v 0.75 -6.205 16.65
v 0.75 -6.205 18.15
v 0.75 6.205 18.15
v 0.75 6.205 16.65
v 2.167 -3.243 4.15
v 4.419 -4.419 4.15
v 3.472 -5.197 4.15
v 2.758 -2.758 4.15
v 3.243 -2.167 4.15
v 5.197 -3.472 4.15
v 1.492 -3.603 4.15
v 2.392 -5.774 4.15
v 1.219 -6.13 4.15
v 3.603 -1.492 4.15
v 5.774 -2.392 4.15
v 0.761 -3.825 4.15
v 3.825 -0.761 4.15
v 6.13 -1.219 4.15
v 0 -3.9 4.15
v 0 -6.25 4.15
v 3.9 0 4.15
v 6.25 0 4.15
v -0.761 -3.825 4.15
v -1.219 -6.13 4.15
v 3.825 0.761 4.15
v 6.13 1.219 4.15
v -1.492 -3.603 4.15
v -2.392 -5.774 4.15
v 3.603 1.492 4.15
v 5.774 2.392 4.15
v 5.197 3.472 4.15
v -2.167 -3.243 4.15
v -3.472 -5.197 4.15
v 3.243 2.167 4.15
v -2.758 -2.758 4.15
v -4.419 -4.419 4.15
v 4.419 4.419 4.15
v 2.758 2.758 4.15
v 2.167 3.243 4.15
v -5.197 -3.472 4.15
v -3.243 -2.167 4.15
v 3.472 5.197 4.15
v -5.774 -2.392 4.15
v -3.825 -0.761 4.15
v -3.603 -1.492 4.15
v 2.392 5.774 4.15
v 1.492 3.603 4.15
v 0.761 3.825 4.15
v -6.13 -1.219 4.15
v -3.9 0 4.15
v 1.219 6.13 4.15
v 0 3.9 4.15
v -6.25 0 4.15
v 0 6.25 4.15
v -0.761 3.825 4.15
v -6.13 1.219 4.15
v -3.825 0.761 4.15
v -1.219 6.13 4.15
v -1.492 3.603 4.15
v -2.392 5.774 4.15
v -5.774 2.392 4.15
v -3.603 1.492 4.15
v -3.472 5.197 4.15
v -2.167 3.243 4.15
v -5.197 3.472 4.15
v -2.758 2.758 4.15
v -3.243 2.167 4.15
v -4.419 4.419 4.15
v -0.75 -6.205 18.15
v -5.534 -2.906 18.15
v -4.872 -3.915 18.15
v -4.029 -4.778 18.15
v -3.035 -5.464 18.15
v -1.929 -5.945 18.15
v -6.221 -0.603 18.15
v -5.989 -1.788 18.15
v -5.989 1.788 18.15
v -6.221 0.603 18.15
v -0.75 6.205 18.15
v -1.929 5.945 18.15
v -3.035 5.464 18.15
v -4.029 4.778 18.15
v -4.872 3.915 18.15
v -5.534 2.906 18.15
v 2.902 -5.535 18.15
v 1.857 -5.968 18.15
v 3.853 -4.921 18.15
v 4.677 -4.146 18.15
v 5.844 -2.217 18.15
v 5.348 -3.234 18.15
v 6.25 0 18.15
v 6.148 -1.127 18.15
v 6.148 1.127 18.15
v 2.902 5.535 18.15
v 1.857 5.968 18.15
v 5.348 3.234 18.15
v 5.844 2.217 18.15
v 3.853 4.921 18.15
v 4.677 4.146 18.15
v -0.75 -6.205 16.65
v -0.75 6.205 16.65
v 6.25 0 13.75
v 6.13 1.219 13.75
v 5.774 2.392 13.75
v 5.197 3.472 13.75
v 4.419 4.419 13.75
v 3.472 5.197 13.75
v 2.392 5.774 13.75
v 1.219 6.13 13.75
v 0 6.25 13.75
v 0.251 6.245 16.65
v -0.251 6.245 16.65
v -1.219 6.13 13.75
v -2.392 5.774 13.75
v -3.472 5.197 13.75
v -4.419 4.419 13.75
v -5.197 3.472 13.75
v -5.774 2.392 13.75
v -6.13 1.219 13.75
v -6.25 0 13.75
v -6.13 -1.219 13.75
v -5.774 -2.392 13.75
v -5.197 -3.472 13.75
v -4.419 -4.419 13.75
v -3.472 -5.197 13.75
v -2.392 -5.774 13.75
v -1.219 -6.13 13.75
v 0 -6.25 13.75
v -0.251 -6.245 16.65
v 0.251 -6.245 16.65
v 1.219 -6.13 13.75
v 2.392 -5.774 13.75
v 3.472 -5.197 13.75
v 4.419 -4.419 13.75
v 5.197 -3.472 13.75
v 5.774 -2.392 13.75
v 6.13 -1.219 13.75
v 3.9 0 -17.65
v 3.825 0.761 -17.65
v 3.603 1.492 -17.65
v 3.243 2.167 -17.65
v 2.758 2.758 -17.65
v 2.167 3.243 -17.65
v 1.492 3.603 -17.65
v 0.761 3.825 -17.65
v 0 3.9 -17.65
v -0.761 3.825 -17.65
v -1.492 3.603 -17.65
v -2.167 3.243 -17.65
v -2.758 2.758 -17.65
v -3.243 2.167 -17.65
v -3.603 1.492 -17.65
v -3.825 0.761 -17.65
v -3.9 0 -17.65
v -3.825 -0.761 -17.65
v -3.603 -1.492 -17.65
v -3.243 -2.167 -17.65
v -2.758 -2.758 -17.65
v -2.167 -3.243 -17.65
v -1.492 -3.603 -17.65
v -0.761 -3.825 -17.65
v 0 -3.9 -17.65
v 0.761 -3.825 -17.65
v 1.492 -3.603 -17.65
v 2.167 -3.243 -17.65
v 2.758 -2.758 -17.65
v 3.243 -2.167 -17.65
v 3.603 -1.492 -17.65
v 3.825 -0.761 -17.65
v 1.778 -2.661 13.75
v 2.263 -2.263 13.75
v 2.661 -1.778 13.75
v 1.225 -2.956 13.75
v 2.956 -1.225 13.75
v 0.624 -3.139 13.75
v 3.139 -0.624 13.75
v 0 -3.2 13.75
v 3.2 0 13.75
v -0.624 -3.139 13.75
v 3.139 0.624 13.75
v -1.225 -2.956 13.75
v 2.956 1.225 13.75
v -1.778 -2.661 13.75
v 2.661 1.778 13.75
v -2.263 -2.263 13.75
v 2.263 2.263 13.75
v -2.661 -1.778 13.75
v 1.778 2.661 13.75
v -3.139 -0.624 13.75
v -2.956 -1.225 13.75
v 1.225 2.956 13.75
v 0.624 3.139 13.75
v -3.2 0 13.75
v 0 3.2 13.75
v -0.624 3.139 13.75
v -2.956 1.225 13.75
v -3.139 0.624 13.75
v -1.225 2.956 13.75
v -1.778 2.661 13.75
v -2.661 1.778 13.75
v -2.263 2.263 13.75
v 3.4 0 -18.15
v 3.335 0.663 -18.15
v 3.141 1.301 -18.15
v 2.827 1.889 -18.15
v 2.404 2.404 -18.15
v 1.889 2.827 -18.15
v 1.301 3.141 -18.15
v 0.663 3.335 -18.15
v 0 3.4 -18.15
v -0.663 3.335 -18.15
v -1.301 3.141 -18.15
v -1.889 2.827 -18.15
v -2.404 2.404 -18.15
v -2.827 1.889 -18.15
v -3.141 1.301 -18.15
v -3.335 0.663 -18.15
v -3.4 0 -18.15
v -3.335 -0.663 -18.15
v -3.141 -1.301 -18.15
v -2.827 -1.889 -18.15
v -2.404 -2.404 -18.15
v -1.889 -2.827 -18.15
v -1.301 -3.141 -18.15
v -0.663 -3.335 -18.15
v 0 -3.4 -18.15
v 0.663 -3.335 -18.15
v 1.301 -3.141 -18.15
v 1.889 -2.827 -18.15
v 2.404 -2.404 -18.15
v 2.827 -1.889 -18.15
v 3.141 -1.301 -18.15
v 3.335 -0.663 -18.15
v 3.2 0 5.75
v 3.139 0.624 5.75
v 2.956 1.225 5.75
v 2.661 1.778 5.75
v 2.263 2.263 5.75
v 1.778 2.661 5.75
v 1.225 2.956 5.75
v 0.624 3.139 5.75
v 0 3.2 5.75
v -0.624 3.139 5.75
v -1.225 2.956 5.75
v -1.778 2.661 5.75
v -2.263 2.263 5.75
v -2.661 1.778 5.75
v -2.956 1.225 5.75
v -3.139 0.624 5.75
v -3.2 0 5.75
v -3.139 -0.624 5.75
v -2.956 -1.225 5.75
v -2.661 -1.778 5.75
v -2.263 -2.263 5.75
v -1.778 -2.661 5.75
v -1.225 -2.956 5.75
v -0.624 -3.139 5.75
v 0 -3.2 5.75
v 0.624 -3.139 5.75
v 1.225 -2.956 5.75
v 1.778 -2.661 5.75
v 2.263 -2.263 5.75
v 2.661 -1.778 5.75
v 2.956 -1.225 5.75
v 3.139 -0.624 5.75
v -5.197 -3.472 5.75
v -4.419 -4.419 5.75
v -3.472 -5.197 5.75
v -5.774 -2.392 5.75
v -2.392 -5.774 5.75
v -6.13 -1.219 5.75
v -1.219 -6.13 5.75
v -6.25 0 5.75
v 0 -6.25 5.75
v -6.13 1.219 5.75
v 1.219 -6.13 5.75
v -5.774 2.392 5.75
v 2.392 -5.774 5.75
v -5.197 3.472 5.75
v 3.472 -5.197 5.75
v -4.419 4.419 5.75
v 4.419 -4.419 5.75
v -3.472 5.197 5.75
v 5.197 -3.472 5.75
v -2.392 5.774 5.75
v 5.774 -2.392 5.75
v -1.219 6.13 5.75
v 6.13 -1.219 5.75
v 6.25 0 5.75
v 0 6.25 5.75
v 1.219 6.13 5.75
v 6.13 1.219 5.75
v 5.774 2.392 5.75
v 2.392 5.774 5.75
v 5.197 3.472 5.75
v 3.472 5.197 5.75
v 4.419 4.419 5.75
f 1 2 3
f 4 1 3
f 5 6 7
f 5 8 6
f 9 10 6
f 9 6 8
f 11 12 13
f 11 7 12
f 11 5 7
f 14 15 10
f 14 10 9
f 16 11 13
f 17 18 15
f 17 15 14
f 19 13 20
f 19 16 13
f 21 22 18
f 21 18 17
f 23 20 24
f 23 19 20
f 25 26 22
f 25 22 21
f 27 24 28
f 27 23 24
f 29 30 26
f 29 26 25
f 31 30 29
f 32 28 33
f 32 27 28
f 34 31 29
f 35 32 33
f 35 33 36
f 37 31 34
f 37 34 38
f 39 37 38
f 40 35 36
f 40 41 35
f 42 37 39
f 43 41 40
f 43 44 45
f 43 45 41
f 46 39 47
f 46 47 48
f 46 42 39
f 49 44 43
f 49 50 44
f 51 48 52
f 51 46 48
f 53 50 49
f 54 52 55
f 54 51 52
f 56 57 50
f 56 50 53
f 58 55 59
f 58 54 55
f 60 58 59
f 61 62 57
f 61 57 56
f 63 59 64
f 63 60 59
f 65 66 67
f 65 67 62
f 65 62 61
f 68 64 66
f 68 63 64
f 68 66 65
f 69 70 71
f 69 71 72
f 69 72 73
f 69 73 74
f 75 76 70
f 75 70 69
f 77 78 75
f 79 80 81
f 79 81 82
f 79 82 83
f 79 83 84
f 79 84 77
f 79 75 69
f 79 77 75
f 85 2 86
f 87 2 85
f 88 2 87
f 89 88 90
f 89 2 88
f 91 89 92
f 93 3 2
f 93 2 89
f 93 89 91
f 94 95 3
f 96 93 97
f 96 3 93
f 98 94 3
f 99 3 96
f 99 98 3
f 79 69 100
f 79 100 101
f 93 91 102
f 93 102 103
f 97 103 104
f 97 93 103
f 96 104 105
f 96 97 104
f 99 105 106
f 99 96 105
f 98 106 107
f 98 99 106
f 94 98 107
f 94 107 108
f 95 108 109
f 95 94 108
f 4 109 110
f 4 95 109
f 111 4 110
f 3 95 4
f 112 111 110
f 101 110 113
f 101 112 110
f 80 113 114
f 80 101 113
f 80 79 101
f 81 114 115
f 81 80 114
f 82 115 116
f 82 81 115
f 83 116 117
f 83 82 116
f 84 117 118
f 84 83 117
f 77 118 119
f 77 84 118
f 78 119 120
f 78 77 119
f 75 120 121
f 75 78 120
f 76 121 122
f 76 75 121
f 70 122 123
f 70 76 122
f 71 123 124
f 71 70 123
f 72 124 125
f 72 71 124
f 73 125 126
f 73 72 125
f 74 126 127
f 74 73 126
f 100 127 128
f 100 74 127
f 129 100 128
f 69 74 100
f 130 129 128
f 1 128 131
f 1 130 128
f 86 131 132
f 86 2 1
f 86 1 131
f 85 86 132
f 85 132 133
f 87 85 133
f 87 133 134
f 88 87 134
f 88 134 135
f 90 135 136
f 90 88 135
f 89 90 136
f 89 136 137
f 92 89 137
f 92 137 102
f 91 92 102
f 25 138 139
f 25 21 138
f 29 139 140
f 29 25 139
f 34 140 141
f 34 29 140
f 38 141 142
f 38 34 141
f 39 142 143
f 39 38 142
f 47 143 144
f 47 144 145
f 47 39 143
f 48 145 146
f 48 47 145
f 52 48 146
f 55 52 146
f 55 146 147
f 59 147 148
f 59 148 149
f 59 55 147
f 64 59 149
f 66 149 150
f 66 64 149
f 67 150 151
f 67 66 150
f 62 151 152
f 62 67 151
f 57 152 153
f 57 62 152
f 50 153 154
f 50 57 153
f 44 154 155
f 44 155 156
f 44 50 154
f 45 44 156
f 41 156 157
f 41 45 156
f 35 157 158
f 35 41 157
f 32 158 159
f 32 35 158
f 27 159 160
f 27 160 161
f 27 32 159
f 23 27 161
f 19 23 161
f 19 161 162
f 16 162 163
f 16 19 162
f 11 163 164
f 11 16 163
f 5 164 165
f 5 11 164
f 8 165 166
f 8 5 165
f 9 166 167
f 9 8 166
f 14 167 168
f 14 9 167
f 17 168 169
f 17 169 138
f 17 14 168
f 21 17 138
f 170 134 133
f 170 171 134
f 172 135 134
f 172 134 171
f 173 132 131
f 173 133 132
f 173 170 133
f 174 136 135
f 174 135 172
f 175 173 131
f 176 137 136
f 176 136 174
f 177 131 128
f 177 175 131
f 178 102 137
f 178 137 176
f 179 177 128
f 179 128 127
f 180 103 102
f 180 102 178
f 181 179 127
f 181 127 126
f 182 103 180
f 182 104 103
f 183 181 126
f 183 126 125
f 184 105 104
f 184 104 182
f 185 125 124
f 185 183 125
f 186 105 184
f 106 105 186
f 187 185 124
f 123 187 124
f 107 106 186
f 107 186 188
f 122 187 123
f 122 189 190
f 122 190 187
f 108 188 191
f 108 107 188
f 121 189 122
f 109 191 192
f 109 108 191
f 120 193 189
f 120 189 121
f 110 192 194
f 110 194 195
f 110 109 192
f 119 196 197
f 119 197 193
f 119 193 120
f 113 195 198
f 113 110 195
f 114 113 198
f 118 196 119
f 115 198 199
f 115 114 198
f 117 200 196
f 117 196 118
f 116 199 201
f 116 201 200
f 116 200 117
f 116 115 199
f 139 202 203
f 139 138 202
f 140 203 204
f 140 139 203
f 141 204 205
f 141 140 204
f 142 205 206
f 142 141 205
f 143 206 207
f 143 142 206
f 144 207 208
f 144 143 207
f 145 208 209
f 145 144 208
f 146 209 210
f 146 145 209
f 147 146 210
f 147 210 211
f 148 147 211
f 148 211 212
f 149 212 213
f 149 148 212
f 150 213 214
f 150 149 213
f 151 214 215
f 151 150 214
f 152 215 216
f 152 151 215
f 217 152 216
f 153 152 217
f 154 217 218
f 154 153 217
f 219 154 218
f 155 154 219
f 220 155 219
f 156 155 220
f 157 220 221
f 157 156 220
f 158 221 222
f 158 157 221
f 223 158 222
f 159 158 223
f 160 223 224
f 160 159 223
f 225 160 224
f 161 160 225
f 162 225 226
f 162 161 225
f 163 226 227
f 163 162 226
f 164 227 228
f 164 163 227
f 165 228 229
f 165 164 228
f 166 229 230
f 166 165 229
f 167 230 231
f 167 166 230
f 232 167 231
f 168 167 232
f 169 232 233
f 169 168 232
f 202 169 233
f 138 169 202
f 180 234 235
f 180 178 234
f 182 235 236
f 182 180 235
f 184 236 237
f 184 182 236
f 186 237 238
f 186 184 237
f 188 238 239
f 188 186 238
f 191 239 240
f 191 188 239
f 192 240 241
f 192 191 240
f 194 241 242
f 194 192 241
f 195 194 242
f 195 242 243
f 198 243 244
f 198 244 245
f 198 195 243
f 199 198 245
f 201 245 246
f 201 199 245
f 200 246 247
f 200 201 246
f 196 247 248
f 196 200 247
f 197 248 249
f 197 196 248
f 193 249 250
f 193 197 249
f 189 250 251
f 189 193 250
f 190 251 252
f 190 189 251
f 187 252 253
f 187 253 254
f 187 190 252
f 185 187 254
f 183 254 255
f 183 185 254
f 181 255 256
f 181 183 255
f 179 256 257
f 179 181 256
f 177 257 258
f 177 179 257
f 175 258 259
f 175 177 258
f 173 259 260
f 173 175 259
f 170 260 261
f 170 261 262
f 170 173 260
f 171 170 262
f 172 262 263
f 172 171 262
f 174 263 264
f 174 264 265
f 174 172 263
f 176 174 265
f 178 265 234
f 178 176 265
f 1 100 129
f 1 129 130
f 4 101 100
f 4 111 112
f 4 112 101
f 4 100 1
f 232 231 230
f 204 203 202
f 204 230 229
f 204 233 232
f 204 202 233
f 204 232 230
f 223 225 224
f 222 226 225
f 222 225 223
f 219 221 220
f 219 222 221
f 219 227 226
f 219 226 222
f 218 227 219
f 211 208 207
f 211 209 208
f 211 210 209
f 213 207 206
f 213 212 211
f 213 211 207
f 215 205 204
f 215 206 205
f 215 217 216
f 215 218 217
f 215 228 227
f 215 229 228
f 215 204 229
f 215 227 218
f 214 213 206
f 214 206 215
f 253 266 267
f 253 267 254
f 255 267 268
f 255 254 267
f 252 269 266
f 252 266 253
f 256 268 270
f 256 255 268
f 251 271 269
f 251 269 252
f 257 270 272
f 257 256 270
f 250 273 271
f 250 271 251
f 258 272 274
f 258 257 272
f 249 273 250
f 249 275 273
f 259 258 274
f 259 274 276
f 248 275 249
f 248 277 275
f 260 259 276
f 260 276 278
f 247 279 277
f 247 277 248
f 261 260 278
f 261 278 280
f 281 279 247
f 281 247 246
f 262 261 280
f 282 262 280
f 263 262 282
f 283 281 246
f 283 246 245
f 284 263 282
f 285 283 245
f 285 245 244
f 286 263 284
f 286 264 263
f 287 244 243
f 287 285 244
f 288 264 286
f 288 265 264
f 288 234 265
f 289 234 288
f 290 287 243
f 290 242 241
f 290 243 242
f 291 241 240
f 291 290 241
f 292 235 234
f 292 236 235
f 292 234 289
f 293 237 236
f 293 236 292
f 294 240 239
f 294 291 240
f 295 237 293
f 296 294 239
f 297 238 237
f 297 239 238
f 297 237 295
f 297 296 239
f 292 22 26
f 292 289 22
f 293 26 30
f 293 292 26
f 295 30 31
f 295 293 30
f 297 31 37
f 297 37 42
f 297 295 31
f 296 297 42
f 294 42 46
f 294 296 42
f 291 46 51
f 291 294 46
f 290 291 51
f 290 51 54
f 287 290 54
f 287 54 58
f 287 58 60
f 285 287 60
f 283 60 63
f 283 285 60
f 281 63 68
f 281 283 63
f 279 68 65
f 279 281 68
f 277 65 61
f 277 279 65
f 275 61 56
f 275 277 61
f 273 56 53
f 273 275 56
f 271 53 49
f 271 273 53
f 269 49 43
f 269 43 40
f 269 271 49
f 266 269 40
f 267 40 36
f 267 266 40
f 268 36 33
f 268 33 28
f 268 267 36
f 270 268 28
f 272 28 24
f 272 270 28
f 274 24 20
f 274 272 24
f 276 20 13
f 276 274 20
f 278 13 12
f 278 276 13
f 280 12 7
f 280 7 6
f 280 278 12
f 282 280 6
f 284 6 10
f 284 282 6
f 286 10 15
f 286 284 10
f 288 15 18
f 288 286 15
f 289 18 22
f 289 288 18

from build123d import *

# Parameters (mm, degrees)
F2_W     = 1.5
F2_H     = 13
F3_DEPTH = 1.5


with BuildPart() as f1:
    # F0 (on Front) → F1 (revolve)
    with BuildSketch(Plane.XZ):
        Polygon((0, 18.15), (0, -18.15), (3.4, -18.15), (3.9, -17.65), (3.9, 4.15), (6.25, 4.15), (6.25, 5.75), (3.2, 5.75), (3.2, 13.75), (6.25, 13.75), (6.25, 18.15), align=None)
    revolve(axis=Axis((0, 0, 0), (0, 0, 1)))

    # F2 (on face) → F3 (cut)
    with BuildSketch(Plane.XY.offset(18.15)):
        Rectangle(F2_W, F2_H)
    extrude(amount=-F3_DEPTH, mode=Mode.SUBTRACT)


solid = f1.part
